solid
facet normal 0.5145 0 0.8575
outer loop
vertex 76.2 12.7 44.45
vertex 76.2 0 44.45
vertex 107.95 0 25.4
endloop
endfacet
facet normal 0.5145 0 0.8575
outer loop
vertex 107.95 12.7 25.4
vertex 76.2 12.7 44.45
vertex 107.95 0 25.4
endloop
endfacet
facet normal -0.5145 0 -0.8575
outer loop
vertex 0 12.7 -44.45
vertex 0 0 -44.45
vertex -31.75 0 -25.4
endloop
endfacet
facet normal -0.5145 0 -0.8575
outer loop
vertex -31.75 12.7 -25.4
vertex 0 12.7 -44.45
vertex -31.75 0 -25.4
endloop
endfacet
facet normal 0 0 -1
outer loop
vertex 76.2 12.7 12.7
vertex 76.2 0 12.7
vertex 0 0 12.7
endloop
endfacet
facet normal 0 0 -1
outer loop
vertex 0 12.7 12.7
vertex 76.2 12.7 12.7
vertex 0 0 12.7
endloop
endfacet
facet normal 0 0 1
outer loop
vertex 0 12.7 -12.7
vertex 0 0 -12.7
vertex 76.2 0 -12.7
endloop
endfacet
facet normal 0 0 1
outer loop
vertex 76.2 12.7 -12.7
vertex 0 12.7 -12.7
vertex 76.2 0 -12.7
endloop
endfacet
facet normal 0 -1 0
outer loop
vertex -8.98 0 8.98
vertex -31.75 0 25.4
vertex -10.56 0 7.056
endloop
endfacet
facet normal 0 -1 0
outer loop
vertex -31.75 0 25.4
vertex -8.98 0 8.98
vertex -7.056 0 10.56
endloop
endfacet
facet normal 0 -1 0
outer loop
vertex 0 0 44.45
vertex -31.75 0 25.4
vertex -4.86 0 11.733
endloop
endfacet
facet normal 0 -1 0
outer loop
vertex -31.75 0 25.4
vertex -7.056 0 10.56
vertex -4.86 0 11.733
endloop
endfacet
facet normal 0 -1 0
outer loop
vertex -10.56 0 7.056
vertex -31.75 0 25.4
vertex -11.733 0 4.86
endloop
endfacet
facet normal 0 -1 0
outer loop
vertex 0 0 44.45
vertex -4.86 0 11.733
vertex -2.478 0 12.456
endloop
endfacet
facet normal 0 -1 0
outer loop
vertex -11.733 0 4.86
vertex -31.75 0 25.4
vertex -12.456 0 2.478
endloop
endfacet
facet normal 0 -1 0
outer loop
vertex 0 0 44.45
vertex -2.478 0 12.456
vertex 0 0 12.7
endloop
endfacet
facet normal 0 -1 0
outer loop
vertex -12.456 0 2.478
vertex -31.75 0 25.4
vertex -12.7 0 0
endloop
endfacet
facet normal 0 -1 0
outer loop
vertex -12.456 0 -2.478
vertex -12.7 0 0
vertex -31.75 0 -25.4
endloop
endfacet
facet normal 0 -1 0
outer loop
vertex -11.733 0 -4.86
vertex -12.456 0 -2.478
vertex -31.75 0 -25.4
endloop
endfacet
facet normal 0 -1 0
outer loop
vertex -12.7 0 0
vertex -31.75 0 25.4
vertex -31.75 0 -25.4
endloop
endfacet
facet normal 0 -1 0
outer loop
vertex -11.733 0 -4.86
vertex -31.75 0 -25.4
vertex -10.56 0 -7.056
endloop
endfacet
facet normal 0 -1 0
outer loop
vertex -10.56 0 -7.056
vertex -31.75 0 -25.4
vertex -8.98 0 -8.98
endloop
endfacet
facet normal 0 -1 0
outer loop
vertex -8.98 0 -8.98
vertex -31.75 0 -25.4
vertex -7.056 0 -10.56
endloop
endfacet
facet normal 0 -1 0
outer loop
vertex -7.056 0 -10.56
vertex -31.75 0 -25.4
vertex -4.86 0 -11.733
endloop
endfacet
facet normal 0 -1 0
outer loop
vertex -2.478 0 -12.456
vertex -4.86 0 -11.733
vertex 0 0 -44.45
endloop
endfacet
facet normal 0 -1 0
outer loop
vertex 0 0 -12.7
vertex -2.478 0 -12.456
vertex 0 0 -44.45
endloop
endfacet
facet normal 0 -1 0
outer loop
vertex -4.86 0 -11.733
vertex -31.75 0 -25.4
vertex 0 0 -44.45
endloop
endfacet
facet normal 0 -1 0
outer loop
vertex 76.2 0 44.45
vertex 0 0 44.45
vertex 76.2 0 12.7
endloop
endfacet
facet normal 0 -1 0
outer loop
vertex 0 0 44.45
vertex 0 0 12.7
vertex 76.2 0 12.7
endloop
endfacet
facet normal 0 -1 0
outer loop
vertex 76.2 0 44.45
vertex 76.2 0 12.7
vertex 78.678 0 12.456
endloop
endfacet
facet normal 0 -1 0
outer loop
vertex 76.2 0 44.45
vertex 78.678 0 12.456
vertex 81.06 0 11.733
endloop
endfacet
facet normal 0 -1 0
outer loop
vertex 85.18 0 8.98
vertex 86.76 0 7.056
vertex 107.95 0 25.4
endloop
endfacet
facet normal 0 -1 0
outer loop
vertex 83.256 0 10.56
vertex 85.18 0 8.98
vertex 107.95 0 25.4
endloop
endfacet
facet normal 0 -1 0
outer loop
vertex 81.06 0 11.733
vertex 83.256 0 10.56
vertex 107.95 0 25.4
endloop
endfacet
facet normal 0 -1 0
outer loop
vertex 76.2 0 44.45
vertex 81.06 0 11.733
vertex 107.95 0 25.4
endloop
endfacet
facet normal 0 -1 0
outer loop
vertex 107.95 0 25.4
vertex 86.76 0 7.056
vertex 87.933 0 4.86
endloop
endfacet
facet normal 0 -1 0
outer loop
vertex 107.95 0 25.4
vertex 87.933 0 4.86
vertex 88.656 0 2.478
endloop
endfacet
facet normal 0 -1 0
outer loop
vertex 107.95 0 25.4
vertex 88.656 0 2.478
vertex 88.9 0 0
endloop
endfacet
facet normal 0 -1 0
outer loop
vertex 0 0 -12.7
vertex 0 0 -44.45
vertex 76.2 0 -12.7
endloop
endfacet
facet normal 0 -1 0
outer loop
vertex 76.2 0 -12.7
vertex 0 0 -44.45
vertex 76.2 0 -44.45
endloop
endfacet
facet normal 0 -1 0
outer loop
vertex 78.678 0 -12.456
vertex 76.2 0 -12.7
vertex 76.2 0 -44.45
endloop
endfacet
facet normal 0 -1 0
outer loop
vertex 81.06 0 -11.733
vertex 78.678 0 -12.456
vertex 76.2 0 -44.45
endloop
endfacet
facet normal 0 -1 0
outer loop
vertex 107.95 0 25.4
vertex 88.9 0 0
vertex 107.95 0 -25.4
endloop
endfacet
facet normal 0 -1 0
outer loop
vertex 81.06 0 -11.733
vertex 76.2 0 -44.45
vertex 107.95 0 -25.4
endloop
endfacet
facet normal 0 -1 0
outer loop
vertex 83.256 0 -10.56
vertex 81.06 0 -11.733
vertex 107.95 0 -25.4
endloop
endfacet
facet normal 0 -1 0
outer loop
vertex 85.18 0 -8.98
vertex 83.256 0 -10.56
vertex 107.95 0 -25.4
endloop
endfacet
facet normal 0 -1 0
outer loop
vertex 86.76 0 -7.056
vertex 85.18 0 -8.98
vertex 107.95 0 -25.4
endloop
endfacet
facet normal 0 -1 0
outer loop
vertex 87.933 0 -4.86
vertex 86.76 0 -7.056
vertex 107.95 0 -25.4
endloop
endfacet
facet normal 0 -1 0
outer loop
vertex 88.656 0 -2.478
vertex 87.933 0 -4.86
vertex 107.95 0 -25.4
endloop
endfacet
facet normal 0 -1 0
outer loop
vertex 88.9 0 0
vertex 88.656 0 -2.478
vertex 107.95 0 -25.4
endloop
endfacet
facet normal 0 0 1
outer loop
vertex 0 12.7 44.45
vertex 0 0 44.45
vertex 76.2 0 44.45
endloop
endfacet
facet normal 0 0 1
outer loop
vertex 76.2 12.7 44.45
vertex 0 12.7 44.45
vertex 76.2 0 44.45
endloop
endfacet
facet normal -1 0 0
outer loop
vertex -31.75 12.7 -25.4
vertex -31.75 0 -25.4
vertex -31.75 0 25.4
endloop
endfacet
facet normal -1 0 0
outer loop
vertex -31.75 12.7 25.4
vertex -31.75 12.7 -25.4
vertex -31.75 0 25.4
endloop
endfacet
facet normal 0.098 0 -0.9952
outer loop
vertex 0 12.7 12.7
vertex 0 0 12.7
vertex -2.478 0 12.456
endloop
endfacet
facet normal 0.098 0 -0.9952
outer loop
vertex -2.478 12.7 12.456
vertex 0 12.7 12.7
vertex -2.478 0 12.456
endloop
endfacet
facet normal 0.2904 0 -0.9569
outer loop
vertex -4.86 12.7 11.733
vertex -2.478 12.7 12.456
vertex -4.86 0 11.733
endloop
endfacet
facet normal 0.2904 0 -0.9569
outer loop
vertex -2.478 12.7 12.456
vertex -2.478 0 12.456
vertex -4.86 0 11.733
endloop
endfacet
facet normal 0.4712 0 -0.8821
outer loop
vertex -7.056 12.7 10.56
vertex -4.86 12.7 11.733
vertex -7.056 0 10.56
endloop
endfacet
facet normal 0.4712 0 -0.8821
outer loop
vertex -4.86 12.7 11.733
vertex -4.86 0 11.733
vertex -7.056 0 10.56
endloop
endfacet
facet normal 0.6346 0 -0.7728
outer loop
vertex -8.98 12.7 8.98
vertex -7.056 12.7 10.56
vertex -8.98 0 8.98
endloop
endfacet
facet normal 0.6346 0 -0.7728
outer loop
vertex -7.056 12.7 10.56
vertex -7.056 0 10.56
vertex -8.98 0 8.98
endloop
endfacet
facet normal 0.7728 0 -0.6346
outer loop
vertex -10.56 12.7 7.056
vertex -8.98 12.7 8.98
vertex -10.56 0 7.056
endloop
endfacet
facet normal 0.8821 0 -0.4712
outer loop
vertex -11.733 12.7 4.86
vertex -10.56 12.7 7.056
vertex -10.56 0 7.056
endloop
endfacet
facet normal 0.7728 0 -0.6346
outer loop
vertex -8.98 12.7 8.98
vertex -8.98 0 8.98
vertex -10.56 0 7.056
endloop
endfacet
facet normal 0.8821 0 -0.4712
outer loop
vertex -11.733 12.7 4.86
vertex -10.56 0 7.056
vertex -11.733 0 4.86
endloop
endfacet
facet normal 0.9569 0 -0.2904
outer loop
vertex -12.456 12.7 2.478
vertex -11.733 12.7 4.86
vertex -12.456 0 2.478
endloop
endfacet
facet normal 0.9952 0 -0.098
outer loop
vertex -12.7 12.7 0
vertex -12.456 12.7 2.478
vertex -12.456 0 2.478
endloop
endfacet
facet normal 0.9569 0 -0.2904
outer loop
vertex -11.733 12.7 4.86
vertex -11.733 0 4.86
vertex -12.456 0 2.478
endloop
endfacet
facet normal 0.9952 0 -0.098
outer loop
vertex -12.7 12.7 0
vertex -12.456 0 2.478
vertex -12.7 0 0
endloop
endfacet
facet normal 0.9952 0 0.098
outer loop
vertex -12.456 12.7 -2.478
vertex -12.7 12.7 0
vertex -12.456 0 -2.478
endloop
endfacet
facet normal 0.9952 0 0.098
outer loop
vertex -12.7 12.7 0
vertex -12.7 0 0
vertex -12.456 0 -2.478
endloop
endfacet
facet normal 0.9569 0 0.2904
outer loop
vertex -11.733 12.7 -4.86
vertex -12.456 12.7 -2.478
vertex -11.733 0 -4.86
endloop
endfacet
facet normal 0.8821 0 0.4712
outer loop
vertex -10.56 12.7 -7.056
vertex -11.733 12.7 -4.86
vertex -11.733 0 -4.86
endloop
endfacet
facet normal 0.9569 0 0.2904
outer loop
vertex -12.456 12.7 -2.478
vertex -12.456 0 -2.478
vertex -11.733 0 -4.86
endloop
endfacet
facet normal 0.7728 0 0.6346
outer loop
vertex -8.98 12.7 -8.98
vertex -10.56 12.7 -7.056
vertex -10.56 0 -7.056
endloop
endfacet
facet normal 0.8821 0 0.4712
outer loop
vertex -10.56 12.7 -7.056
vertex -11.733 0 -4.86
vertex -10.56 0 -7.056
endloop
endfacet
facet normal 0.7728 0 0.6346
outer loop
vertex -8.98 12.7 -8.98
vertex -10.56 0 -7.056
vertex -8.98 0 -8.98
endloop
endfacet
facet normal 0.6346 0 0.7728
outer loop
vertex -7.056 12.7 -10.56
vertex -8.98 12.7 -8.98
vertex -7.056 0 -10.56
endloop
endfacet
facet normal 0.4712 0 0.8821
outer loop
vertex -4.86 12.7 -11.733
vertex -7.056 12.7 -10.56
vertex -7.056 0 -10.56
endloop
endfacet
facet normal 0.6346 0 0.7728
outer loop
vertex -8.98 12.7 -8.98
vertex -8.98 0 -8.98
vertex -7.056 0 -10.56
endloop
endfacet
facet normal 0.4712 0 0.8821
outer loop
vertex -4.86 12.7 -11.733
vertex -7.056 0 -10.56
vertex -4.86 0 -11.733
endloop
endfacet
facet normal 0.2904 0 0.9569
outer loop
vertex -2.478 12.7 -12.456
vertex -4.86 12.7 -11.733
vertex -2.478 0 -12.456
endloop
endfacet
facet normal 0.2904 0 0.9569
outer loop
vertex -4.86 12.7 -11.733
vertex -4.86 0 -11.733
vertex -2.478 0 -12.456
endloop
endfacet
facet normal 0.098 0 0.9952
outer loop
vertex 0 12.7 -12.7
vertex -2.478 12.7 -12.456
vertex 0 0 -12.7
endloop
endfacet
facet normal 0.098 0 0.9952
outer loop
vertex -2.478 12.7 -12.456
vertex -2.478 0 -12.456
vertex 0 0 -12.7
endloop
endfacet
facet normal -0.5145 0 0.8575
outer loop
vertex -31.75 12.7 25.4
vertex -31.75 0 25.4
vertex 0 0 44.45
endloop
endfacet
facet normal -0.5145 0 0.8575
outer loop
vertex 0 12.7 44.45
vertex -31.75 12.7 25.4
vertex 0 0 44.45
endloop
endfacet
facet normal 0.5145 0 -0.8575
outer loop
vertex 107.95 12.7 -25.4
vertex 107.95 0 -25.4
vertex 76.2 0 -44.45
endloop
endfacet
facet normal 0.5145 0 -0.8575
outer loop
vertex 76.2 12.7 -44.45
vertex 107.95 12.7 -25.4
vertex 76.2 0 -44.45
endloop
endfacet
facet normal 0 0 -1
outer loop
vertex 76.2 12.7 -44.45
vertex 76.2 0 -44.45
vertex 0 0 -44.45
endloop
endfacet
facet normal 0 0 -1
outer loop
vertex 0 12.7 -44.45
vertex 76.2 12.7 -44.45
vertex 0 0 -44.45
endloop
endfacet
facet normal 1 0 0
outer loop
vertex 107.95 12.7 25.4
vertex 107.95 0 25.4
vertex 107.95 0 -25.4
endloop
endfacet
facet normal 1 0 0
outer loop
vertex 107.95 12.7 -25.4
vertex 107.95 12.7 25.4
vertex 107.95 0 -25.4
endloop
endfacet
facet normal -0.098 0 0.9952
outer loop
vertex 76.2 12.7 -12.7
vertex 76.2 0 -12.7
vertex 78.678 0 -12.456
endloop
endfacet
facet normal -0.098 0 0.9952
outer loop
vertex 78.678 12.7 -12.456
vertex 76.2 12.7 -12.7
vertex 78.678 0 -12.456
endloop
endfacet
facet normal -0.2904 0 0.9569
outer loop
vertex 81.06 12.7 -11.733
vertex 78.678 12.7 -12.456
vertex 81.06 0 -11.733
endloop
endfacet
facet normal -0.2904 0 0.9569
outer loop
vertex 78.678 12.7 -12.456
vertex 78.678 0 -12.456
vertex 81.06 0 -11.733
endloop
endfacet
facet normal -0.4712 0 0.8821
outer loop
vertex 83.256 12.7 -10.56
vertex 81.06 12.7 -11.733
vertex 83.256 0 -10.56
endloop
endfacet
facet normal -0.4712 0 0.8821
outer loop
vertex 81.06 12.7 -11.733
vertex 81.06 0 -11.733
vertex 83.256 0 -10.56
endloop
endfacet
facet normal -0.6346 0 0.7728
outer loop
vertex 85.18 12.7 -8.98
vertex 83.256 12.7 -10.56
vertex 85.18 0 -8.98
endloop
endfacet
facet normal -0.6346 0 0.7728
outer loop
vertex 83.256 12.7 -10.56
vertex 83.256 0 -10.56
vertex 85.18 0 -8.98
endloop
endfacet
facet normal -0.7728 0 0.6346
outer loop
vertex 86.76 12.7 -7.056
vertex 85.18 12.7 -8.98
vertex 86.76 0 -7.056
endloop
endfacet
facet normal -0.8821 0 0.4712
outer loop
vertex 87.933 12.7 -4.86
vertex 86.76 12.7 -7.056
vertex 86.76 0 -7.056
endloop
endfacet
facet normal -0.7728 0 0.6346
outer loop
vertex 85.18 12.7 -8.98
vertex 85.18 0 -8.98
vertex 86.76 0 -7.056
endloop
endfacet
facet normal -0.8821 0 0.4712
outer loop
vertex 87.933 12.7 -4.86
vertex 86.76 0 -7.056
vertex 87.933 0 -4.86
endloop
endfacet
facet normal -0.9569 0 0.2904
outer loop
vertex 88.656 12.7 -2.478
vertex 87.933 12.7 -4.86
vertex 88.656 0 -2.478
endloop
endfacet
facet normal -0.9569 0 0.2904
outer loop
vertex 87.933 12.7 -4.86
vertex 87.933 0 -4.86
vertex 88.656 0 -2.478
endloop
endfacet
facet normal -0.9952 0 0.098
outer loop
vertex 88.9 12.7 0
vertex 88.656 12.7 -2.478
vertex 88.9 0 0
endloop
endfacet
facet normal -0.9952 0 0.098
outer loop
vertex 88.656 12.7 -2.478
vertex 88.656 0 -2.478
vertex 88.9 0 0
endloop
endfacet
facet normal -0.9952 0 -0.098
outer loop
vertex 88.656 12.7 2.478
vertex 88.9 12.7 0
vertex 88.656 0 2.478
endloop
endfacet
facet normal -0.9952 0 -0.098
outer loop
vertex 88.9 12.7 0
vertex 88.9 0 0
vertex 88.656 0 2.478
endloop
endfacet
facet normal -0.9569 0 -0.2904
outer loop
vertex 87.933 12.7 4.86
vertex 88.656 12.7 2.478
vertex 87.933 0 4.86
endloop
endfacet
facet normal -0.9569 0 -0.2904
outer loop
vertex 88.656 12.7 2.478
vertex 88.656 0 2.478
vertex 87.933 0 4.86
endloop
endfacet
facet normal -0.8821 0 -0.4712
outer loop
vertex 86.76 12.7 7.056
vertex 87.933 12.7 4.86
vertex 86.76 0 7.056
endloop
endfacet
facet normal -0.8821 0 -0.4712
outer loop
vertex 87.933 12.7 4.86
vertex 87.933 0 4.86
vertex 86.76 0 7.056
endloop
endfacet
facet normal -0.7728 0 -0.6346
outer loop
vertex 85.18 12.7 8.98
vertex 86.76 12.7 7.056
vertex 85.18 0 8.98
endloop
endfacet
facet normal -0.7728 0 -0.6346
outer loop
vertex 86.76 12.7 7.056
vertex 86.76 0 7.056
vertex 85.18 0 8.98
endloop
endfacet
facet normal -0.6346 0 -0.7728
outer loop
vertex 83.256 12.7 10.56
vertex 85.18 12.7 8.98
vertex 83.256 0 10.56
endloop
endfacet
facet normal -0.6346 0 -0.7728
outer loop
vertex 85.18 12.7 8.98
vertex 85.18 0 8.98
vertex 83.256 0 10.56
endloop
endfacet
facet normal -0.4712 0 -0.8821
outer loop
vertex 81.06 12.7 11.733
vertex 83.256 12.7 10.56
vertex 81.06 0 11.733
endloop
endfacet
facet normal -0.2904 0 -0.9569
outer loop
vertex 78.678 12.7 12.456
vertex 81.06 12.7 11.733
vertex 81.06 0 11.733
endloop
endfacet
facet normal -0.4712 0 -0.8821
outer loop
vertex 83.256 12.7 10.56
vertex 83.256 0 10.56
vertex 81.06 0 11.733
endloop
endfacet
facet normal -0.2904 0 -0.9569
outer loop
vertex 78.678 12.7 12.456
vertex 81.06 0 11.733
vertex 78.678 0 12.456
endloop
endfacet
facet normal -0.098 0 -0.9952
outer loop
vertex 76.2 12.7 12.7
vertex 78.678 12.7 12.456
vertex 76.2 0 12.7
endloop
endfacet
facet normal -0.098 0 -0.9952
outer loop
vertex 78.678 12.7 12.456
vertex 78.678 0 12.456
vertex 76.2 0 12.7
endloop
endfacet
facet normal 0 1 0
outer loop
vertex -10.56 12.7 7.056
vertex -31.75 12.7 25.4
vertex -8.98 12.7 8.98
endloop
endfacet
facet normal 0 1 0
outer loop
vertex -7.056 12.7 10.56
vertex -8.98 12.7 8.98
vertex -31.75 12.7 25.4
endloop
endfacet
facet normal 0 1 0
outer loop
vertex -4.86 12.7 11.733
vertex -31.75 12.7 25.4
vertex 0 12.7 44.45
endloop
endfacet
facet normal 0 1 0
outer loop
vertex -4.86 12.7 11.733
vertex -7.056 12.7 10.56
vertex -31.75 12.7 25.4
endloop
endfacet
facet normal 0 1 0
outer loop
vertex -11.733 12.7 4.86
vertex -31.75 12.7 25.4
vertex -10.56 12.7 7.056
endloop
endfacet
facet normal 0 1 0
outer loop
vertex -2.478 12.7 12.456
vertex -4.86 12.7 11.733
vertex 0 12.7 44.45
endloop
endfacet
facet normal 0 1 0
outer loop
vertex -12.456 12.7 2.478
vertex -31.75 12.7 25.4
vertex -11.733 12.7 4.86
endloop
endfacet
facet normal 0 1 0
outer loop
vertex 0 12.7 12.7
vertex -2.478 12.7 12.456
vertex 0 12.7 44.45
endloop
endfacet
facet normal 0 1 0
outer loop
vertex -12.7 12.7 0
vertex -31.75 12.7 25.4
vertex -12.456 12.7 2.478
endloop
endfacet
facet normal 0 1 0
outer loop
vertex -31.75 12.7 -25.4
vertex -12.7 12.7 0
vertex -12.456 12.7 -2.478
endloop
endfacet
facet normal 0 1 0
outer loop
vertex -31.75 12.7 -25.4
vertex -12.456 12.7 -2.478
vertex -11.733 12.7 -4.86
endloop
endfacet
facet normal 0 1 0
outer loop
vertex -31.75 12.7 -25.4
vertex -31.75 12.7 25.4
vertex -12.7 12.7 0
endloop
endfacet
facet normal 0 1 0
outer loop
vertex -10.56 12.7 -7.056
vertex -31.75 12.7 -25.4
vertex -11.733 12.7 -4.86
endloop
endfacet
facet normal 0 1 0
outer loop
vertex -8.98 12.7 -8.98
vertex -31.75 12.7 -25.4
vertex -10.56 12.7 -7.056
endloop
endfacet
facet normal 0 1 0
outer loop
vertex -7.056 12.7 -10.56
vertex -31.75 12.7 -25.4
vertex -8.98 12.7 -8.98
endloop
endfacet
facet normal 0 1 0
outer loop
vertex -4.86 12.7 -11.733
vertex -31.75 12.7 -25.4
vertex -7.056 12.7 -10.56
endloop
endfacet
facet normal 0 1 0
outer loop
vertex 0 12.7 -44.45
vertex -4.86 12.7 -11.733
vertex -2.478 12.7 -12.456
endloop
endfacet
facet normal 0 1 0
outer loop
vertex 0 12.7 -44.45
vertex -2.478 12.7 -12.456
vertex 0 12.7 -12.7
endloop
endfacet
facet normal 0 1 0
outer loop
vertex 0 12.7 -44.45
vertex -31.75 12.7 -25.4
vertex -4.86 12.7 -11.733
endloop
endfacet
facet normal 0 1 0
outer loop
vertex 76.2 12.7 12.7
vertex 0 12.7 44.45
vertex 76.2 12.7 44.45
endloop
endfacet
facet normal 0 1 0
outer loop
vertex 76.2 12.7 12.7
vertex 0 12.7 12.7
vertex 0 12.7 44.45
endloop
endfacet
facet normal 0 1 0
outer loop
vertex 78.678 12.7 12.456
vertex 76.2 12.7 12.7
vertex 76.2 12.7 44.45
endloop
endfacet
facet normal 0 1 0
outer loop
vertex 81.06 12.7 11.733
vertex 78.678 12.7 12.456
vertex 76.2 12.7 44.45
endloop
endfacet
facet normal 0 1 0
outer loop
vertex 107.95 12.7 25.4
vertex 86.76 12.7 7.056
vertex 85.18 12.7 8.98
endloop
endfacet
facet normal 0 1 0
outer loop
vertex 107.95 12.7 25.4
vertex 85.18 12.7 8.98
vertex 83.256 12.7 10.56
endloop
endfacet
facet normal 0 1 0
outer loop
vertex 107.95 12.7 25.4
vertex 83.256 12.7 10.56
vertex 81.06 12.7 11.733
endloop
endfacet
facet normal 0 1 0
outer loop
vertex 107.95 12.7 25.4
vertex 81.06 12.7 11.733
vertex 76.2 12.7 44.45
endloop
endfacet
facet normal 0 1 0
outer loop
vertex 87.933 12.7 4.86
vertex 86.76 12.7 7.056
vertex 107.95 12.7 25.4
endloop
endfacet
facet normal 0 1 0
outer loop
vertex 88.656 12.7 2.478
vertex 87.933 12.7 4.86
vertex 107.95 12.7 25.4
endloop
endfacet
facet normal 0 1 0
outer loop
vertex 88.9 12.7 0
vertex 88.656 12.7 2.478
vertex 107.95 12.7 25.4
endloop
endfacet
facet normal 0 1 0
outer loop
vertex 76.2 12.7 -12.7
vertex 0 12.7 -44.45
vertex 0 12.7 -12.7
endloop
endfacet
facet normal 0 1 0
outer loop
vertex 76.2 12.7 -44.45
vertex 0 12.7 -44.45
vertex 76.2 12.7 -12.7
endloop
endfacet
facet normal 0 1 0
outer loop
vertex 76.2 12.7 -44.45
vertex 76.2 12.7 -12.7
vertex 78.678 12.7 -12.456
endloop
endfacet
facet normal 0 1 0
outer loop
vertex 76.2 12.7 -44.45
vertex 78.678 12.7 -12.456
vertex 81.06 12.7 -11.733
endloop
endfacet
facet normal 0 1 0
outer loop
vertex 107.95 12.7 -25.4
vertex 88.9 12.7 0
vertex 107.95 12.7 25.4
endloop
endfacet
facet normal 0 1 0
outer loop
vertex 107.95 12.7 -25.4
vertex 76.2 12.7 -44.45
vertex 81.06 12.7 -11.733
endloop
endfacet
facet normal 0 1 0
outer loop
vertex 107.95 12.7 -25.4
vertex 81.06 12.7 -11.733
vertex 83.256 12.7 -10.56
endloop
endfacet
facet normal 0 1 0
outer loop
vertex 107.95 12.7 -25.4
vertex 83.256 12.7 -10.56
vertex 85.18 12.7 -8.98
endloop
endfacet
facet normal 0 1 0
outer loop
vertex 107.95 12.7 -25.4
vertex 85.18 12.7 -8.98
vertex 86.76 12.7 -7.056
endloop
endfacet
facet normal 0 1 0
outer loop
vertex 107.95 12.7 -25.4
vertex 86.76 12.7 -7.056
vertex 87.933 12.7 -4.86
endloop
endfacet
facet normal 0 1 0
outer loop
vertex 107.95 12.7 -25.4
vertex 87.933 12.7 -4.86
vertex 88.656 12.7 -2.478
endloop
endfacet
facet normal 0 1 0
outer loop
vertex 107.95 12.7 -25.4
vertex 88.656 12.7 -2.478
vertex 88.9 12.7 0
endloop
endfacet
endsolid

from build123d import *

# Parameters (mm, degrees)
BOSS_EXTRUDE1_DEPTH = 12.7


with BuildPart() as part:
    # Sketch2 → Boss-Extrude1 (new body)
    with BuildSketch(Plane(origin=(0, 0, 0), x_dir=(1, 0, 0), z_dir=(0, 1, 0))):
        Polygon((0, 44.45), (-31.75, 25.4), (-31.75, -25.4), (0, -44.45), (76.2, -44.45), (107.95, -25.4), (107.95, 25.4), (76.2, 44.45), align=None)
        with BuildLine():
            Line((0, 12.7), (76.2, 12.7))
            ThreePointArc((76.2, 12.7), (88.9, 0), (76.2, -12.7))
            Line((76.2, -12.7), (0, -12.7))
            ThreePointArc((0, -12.7), (-12.7, 0), (0, 12.7))
        make_face(mode=Mode.SUBTRACT)
    extrude(amount=BOSS_EXTRUDE1_DEPTH)


solid = part.part
